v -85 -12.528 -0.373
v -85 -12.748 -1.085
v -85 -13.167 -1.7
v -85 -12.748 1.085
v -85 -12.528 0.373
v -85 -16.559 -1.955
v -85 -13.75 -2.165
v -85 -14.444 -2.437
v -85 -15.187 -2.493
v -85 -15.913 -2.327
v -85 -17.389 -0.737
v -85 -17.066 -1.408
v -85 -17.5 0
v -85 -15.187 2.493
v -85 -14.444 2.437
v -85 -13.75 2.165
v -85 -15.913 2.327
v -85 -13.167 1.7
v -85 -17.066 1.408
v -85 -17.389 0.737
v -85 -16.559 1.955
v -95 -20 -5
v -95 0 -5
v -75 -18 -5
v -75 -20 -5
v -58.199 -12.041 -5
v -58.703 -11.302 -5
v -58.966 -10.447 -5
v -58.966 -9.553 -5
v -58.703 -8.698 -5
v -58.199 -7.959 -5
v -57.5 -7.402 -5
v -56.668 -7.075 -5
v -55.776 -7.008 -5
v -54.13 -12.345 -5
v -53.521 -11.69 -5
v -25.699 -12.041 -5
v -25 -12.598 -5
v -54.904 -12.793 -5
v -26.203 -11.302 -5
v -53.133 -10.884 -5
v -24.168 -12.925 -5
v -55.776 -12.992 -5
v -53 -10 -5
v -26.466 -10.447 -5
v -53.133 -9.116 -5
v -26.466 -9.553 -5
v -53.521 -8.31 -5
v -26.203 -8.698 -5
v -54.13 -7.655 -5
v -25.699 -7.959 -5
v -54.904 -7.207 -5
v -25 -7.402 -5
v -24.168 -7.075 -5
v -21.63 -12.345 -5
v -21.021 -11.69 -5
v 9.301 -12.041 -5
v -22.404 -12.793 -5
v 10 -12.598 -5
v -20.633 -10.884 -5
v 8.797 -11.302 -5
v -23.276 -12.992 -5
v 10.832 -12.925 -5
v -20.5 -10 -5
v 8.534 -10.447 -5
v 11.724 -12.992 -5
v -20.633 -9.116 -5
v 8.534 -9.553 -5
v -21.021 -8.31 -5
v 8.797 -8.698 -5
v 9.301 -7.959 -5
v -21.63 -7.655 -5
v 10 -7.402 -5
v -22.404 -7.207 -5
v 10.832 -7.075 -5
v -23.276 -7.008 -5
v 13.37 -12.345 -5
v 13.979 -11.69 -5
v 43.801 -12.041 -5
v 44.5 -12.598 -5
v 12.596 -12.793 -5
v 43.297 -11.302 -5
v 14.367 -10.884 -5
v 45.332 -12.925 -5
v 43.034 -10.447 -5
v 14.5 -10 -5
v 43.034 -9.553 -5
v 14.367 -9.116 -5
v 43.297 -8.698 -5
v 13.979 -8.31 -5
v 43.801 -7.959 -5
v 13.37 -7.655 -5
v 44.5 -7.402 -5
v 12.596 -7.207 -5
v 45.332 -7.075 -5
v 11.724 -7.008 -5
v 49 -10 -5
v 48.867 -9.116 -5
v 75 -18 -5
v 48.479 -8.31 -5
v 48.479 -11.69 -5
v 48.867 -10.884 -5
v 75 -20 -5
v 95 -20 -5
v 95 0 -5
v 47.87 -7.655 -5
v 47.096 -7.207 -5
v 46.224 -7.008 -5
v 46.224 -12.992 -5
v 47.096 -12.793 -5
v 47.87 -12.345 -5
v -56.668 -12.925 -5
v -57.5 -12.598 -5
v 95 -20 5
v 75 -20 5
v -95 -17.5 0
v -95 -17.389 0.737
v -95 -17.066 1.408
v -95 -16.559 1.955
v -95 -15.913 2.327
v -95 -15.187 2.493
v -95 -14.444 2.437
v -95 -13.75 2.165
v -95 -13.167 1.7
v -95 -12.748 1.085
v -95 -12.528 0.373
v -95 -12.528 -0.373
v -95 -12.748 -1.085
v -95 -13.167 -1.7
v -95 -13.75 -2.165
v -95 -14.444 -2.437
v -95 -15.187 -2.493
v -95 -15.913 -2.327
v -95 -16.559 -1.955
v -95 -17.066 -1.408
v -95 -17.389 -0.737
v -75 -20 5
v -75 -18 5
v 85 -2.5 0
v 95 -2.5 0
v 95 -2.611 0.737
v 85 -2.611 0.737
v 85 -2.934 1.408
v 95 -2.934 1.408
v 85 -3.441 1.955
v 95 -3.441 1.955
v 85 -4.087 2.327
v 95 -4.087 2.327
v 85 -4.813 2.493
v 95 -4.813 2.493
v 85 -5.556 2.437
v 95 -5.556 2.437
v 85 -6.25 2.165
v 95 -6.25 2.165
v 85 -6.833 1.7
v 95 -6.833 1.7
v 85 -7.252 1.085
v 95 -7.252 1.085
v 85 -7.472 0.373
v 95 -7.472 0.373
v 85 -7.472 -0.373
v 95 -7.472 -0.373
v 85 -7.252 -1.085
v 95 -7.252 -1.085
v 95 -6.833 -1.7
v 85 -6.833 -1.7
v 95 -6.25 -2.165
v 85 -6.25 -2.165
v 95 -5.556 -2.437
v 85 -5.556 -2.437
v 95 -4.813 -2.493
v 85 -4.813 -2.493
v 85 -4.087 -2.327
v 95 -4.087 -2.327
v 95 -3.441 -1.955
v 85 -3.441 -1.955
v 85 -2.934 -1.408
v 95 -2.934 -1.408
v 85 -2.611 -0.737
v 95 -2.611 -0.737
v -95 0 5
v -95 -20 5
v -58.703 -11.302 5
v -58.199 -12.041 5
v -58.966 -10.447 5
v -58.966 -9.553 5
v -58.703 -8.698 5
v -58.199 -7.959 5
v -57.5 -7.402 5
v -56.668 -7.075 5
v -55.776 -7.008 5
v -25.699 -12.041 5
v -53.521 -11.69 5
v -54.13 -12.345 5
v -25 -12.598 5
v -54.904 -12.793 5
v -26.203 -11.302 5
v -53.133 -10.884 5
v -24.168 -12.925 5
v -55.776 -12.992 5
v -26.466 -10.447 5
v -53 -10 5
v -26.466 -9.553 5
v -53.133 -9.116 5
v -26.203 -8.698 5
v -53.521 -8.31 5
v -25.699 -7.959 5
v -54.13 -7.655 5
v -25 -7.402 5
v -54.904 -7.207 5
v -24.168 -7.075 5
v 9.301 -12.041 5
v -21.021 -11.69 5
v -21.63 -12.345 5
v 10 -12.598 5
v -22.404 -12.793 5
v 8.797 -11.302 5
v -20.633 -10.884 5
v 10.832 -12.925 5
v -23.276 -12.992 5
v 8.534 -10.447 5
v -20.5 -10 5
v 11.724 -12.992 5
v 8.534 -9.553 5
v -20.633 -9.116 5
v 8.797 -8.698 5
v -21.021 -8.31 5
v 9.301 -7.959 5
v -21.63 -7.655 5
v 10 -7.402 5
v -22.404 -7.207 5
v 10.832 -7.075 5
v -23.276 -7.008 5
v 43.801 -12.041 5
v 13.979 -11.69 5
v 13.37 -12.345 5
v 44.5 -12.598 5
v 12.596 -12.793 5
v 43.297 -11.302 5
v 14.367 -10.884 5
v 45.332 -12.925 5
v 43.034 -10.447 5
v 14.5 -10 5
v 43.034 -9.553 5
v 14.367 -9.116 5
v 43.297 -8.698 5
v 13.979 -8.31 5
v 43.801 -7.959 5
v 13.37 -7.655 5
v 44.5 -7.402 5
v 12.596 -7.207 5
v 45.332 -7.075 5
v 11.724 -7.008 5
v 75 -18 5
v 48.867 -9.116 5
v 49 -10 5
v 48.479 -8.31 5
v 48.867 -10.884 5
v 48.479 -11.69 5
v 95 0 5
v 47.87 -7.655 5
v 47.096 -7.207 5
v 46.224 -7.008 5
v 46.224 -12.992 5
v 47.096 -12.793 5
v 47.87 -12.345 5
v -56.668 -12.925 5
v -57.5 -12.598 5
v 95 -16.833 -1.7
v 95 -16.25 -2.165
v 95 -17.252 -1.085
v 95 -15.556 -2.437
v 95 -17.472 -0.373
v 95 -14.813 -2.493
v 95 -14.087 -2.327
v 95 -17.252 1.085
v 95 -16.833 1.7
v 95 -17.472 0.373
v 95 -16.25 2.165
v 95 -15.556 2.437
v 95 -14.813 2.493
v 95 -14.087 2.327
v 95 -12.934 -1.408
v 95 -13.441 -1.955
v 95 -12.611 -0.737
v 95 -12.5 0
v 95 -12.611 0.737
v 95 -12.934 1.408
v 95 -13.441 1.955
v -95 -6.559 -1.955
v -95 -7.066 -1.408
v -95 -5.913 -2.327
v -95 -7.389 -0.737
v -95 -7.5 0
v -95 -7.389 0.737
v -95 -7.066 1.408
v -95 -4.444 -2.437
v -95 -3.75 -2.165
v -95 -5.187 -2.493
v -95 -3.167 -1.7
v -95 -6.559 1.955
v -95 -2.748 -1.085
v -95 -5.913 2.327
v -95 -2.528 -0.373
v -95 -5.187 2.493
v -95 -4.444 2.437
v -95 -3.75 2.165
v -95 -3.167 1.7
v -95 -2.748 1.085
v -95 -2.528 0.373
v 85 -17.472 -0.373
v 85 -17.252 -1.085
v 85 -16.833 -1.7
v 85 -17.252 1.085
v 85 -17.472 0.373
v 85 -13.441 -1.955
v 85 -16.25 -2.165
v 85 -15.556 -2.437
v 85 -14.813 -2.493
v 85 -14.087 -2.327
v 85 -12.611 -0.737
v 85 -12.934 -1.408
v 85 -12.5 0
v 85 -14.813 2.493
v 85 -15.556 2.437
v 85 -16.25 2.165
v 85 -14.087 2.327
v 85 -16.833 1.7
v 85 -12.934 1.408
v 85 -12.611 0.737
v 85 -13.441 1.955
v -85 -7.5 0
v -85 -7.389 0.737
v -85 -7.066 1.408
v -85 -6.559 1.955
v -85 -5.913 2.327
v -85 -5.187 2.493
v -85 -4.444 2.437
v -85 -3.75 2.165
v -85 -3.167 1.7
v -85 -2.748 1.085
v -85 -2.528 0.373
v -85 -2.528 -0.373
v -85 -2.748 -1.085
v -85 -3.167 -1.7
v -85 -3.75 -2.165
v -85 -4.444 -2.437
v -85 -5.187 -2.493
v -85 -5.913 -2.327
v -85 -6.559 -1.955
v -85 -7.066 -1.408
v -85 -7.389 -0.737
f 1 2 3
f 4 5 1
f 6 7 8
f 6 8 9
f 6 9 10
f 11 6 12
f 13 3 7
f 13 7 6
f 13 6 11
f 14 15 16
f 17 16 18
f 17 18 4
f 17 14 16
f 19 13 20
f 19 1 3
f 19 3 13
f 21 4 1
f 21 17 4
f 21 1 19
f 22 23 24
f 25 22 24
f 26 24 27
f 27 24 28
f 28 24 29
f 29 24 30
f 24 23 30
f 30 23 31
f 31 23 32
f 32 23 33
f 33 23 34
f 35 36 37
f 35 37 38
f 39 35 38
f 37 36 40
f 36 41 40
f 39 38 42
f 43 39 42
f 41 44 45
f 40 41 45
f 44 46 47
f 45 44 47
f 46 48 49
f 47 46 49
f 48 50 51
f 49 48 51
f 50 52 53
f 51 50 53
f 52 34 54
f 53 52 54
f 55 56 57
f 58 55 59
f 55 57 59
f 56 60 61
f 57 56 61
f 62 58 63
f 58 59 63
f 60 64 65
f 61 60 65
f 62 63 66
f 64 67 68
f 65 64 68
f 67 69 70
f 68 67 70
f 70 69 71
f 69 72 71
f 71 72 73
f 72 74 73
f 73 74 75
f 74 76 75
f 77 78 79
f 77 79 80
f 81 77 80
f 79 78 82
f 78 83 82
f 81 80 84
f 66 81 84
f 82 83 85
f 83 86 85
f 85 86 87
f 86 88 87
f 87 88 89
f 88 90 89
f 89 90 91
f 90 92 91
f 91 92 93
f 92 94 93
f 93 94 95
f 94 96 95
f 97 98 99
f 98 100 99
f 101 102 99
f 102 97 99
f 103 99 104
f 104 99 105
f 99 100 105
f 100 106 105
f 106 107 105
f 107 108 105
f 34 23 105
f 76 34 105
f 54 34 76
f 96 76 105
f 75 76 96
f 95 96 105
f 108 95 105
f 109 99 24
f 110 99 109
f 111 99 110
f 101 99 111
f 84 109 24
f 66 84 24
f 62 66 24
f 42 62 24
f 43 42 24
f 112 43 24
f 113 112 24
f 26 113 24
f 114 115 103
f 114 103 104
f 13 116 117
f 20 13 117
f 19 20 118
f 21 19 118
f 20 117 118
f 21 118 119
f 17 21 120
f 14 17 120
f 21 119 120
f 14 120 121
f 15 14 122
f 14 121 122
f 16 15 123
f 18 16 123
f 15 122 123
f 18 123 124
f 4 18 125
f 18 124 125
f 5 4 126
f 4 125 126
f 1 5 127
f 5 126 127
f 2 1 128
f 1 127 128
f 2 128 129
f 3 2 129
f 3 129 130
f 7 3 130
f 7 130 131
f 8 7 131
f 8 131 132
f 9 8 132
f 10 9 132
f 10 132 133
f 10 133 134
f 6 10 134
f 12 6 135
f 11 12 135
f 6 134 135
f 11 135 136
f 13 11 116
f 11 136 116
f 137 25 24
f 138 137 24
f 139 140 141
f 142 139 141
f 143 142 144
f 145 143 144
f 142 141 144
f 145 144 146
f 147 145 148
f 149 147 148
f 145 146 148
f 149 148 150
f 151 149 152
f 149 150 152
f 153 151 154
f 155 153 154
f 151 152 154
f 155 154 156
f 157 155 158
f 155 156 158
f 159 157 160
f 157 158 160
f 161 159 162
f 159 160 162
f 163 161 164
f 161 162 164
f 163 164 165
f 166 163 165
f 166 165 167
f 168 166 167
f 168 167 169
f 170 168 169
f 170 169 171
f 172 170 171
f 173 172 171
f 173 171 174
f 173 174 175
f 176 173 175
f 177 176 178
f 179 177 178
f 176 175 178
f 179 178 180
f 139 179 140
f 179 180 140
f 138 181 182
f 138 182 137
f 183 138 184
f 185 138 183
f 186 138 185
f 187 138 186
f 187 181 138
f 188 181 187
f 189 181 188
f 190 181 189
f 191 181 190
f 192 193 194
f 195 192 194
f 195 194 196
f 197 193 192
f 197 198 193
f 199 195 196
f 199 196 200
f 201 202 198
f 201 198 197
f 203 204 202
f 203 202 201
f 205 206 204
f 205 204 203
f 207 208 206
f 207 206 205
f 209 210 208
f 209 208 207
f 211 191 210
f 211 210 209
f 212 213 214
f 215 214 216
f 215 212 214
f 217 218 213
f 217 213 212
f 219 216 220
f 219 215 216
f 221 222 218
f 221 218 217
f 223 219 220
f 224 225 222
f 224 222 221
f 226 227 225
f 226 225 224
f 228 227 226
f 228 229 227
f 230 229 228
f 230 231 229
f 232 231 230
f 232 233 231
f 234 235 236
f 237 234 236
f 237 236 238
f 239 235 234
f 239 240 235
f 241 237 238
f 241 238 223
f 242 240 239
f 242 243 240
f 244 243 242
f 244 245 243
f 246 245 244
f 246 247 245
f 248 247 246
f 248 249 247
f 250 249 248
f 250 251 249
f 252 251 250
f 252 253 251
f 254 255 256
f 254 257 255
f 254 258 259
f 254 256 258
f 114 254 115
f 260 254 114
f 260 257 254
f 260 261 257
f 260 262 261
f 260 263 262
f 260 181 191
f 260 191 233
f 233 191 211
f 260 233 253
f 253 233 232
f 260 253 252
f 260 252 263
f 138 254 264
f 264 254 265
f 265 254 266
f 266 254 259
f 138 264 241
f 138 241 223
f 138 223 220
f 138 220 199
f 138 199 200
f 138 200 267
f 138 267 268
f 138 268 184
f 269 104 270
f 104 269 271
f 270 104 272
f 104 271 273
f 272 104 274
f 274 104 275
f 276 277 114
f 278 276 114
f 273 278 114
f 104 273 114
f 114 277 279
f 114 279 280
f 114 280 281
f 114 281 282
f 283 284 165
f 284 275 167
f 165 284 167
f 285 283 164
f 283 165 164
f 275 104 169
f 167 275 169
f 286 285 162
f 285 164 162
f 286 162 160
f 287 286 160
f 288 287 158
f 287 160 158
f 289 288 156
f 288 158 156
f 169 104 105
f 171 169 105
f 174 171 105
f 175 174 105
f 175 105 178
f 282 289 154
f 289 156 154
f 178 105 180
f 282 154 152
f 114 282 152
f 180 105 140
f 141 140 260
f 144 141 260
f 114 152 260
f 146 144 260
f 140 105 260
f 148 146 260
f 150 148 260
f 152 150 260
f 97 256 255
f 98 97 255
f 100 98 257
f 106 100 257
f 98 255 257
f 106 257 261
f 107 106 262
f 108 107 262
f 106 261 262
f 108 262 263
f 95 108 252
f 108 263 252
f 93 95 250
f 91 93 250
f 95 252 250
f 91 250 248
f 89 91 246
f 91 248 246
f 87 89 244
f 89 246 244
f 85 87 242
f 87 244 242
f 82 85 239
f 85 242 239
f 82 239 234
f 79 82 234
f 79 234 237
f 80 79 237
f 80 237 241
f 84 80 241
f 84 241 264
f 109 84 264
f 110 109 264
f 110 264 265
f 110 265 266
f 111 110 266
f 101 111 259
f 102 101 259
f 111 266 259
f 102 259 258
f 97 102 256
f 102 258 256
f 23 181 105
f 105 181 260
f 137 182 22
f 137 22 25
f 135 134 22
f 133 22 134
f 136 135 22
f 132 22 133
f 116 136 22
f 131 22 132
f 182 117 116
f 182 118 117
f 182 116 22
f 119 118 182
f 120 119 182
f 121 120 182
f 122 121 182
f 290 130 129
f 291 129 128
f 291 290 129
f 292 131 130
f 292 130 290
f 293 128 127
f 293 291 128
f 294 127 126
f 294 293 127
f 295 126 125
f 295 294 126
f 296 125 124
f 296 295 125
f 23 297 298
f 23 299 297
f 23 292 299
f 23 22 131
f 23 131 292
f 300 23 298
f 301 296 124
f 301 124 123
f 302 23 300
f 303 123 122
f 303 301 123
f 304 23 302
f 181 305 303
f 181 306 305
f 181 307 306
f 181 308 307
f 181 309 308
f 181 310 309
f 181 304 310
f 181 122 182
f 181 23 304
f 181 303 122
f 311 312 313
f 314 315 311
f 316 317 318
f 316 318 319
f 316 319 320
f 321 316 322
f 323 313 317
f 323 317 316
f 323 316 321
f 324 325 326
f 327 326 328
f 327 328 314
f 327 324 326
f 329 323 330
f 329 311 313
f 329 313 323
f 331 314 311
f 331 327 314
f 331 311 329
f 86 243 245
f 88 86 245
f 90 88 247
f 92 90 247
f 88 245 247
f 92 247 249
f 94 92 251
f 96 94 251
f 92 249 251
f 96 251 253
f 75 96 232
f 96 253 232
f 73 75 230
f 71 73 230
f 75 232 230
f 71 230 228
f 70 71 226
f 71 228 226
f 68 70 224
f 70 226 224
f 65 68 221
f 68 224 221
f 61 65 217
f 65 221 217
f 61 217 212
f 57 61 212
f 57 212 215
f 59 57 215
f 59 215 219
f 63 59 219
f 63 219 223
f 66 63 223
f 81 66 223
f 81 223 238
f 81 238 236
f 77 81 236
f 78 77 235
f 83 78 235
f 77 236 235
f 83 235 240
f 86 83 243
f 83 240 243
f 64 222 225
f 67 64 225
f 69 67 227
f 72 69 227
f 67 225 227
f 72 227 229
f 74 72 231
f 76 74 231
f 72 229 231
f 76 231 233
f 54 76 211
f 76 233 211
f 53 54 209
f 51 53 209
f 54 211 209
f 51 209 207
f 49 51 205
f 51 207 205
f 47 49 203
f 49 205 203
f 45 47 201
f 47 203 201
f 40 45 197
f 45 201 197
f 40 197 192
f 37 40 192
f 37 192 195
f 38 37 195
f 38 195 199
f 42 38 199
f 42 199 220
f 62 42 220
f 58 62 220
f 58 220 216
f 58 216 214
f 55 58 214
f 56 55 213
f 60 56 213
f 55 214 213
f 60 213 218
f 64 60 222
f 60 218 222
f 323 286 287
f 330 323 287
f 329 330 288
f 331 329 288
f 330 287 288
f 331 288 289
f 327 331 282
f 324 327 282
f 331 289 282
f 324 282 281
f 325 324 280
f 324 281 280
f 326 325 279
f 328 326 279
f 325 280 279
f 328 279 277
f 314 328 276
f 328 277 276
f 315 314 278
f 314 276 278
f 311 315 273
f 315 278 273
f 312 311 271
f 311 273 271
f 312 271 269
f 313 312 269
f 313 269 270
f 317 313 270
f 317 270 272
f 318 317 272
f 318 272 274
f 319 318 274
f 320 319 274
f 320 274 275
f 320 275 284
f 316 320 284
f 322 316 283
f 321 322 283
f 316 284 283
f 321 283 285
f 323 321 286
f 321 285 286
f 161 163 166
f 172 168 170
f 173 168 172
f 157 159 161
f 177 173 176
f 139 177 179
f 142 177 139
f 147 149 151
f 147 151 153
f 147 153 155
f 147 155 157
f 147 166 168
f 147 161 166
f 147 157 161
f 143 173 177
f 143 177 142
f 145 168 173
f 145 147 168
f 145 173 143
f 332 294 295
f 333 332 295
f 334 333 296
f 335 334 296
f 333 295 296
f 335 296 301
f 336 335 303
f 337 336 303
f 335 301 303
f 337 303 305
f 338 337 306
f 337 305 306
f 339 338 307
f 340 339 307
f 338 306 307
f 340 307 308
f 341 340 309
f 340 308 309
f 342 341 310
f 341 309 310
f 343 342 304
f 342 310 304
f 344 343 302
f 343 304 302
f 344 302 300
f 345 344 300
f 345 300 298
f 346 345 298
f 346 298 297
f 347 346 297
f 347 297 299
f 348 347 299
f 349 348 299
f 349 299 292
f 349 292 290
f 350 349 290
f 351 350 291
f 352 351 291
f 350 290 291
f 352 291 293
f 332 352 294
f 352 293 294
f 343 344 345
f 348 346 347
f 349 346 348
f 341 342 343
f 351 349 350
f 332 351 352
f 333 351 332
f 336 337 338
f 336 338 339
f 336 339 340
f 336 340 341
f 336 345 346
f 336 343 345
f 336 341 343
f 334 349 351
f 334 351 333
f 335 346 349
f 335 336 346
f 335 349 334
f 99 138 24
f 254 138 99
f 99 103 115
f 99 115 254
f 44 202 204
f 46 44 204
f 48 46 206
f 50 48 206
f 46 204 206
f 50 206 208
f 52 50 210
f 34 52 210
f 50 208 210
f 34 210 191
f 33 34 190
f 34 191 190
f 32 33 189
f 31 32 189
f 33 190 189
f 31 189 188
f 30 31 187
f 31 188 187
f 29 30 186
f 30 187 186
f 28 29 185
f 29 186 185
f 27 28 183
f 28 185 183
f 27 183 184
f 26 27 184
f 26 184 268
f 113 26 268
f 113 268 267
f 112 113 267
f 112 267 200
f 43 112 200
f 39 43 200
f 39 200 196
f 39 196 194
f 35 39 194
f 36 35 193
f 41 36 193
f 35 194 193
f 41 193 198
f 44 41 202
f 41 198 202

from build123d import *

# Parameters (mm, degrees)
F0_W     = 190
F0_H     = 10
F1_DEPTH = 20
F2_R     = 3
F2_W     = 150
F2_H     = 2
F3_DEPTH = 10
F4_R     = 2.5
F5_DEPTH = 10
F6_R     = 2.5
F7_DEPTH = 10


with BuildPart() as f1:
    # F0 (on Front) → F1 (new body)
    with BuildSketch(Plane.XZ):
        Rectangle(F0_W, F0_H)
    extrude(amount=F1_DEPTH)

    # F2 (on face) → F3 (cut)
    with BuildSketch(Plane.XY.offset(5)):
        with Locations((-56, -10)):
            Circle(F2_R)
        with Locations((-23.5, -10)):
            Circle(F2_R)
        with Locations((11.5, -10)):
            Circle(F2_R)
        with Locations((46, -10)):
            Circle(F2_R)
        with Locations((0, -19)):
            Rectangle(F2_W, F2_H)
    extrude(amount=-F3_DEPTH, mode=Mode.SUBTRACT)

    # F4 (on face) → F5 (cut)
    with BuildSketch(Plane(origin=(-95, 0, 0), x_dir=(0, -1, 0), z_dir=(-1, 0, 0))):
        with Locations((5, 0)):
            Circle(F4_R)
        with Locations((15, 0)):
            Circle(F4_R)
    extrude(amount=-F5_DEPTH, mode=Mode.SUBTRACT)

    # F6 (on face) → F7 (cut)
    with BuildSketch(Plane.YZ.offset(95)):
        with Locations((-5, 0)):
            Circle(F6_R)
        with Locations((-15, 0)):
            Circle(F6_R)
    extrude(amount=-F7_DEPTH, mode=Mode.SUBTRACT)


solid = f1.part
